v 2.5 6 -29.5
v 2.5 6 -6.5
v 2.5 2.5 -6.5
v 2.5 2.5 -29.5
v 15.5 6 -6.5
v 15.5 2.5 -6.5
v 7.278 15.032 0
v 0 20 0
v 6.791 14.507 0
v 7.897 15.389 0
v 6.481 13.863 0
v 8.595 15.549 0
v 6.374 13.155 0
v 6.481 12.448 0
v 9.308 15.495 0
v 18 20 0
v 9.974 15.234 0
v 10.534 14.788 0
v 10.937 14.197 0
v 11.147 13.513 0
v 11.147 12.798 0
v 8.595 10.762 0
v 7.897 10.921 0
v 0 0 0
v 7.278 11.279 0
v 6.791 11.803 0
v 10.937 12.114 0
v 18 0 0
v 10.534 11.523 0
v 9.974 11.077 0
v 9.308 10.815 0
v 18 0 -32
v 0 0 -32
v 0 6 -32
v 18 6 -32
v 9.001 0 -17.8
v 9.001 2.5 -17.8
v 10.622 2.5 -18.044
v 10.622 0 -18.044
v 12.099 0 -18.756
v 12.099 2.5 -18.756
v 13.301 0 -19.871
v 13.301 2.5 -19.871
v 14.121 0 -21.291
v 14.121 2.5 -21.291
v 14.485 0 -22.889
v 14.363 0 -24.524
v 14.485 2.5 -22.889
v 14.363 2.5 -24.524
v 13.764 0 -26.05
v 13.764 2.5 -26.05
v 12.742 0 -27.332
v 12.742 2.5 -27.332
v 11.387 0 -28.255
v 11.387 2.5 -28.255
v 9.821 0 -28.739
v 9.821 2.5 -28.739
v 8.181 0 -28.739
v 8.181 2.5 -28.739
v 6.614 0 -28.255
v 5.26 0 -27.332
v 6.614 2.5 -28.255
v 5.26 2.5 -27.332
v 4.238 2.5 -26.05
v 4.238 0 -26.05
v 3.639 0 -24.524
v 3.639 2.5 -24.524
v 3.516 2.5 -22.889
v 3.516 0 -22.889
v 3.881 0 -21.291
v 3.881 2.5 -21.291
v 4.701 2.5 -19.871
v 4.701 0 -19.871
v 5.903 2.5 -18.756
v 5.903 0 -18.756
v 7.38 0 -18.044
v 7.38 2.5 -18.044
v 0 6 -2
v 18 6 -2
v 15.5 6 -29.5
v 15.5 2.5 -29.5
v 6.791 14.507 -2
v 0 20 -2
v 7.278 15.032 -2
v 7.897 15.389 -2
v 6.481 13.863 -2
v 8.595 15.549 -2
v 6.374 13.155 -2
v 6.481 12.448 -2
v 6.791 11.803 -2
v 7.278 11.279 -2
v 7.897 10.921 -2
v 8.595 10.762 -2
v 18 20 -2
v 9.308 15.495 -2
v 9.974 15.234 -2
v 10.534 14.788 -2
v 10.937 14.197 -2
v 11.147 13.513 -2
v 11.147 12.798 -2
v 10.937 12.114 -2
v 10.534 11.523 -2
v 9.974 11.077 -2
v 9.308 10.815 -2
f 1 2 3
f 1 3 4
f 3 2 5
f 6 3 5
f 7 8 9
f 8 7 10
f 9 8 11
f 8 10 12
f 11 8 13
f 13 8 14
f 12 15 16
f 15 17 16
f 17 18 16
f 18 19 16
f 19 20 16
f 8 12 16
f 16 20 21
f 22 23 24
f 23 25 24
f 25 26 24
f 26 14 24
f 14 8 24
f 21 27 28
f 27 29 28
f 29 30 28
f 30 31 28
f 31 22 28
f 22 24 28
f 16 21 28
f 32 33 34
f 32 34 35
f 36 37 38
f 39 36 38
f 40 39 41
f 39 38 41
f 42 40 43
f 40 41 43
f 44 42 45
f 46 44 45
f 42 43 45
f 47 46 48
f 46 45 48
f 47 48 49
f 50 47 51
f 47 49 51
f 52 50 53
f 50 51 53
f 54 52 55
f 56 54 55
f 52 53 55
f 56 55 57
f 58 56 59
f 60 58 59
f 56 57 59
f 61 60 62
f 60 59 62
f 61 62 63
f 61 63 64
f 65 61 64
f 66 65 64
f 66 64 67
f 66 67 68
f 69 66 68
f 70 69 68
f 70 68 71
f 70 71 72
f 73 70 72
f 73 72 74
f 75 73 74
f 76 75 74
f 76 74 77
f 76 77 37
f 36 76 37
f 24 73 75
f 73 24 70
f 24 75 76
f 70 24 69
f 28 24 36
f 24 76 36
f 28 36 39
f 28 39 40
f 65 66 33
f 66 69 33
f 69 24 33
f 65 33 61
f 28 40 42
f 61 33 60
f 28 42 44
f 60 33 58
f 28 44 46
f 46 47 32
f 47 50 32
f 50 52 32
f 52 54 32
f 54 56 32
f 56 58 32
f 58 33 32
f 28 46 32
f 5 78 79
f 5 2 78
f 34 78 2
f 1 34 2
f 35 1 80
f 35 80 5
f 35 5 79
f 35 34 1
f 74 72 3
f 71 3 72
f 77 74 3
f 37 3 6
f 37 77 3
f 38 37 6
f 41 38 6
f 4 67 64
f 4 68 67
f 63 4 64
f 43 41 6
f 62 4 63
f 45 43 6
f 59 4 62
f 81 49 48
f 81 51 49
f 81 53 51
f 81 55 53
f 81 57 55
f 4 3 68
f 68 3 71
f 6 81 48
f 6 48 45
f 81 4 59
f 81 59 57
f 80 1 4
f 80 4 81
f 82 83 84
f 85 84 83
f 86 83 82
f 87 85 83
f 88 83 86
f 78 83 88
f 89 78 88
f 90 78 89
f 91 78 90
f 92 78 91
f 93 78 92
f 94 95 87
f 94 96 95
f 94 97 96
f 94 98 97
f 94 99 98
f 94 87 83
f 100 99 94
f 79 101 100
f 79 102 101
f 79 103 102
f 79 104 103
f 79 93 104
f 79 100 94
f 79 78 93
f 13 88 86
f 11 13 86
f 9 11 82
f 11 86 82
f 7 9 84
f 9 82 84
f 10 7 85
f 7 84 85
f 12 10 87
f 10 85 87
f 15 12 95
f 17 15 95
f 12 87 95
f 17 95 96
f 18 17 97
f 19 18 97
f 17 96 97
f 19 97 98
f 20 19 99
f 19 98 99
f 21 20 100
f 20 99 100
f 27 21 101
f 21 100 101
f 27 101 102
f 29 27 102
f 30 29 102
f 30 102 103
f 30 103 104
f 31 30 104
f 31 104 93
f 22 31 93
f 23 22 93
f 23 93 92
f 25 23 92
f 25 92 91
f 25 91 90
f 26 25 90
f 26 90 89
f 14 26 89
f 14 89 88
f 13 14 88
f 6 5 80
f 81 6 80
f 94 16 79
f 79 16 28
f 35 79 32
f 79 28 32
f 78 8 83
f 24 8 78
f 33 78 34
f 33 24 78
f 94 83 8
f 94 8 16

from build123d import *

# Parameters (mm, degrees)
SKETCH1_W           = 18
SKETCH1_H           = 32
BOSS_EXTRUDE1_DEPTH = 6
SKETCH2_W           = 13
SKETCH2_H           = 23
CUT_EXTRUDE1_DEPTH  = 3.5
SKETCH3_R           = 5.5
CUT_EXTRUDE2_DEPTH  = 37.881567212
SKETCH4_W           = 18
SKETCH4_H           = 2
BOSS_EXTRUDE2_DEPTH = 14
SKETCH5_R           = 2.4
CUT_EXTRUDE3_DEPTH  = 41.298883359


with BuildPart() as part:
    # Sketch1 → Boss-Extrude1 (new body)
    with BuildSketch(Plane(origin=(0, 0, 0), x_dir=(1, 0, 0), z_dir=(0, 1, 0))):
        with Locations((9, 16)):
            Rectangle(SKETCH1_W, SKETCH1_H)
    extrude(amount=BOSS_EXTRUDE1_DEPTH)

    # Sketch2 → Cut-Extrude1 (cut)
    with BuildSketch(Plane(origin=(0, 6, 0), x_dir=(1, 0, 0), z_dir=(0, 1, 0))):
        with Locations((9, 18)):
            Rectangle(SKETCH2_W, SKETCH2_H)
    extrude(amount=-CUT_EXTRUDE1_DEPTH, mode=Mode.SUBTRACT)

    # Sketch3 → Cut-Extrude2 (cut, through all)
    with BuildSketch(Plane(origin=(0, 2.5, 0), x_dir=(1, 0, 0), z_dir=(0, 1, 0))):
        with Locations(Location((9.000820155, 23.3, 0), (0, 0, 270))):
            Circle(SKETCH3_R)
    extrude(amount=-CUT_EXTRUDE2_DEPTH, mode=Mode.SUBTRACT)

    # Sketch4 → Boss-Extrude2 (add)
    with BuildSketch(Plane(origin=(0, 6, 0), x_dir=(1, 0, 0), z_dir=(0, 1, 0))):
        with Locations((9, 1)):
            Rectangle(SKETCH4_W, SKETCH4_H)
    extrude(amount=BOSS_EXTRUDE2_DEPTH)

    # Sketch5 → Cut-Extrude3 (cut, through all)
    with BuildSketch(Plane(origin=(0, 0, -2), x_dir=(-1, 0, 0), z_dir=(0, 0, -1))):
        with Locations((-8.774181154, 13.15523395)):
            Circle(SKETCH5_R)
    extrude(amount=-CUT_EXTRUDE3_DEPTH, mode=Mode.SUBTRACT)


solid = part.part
